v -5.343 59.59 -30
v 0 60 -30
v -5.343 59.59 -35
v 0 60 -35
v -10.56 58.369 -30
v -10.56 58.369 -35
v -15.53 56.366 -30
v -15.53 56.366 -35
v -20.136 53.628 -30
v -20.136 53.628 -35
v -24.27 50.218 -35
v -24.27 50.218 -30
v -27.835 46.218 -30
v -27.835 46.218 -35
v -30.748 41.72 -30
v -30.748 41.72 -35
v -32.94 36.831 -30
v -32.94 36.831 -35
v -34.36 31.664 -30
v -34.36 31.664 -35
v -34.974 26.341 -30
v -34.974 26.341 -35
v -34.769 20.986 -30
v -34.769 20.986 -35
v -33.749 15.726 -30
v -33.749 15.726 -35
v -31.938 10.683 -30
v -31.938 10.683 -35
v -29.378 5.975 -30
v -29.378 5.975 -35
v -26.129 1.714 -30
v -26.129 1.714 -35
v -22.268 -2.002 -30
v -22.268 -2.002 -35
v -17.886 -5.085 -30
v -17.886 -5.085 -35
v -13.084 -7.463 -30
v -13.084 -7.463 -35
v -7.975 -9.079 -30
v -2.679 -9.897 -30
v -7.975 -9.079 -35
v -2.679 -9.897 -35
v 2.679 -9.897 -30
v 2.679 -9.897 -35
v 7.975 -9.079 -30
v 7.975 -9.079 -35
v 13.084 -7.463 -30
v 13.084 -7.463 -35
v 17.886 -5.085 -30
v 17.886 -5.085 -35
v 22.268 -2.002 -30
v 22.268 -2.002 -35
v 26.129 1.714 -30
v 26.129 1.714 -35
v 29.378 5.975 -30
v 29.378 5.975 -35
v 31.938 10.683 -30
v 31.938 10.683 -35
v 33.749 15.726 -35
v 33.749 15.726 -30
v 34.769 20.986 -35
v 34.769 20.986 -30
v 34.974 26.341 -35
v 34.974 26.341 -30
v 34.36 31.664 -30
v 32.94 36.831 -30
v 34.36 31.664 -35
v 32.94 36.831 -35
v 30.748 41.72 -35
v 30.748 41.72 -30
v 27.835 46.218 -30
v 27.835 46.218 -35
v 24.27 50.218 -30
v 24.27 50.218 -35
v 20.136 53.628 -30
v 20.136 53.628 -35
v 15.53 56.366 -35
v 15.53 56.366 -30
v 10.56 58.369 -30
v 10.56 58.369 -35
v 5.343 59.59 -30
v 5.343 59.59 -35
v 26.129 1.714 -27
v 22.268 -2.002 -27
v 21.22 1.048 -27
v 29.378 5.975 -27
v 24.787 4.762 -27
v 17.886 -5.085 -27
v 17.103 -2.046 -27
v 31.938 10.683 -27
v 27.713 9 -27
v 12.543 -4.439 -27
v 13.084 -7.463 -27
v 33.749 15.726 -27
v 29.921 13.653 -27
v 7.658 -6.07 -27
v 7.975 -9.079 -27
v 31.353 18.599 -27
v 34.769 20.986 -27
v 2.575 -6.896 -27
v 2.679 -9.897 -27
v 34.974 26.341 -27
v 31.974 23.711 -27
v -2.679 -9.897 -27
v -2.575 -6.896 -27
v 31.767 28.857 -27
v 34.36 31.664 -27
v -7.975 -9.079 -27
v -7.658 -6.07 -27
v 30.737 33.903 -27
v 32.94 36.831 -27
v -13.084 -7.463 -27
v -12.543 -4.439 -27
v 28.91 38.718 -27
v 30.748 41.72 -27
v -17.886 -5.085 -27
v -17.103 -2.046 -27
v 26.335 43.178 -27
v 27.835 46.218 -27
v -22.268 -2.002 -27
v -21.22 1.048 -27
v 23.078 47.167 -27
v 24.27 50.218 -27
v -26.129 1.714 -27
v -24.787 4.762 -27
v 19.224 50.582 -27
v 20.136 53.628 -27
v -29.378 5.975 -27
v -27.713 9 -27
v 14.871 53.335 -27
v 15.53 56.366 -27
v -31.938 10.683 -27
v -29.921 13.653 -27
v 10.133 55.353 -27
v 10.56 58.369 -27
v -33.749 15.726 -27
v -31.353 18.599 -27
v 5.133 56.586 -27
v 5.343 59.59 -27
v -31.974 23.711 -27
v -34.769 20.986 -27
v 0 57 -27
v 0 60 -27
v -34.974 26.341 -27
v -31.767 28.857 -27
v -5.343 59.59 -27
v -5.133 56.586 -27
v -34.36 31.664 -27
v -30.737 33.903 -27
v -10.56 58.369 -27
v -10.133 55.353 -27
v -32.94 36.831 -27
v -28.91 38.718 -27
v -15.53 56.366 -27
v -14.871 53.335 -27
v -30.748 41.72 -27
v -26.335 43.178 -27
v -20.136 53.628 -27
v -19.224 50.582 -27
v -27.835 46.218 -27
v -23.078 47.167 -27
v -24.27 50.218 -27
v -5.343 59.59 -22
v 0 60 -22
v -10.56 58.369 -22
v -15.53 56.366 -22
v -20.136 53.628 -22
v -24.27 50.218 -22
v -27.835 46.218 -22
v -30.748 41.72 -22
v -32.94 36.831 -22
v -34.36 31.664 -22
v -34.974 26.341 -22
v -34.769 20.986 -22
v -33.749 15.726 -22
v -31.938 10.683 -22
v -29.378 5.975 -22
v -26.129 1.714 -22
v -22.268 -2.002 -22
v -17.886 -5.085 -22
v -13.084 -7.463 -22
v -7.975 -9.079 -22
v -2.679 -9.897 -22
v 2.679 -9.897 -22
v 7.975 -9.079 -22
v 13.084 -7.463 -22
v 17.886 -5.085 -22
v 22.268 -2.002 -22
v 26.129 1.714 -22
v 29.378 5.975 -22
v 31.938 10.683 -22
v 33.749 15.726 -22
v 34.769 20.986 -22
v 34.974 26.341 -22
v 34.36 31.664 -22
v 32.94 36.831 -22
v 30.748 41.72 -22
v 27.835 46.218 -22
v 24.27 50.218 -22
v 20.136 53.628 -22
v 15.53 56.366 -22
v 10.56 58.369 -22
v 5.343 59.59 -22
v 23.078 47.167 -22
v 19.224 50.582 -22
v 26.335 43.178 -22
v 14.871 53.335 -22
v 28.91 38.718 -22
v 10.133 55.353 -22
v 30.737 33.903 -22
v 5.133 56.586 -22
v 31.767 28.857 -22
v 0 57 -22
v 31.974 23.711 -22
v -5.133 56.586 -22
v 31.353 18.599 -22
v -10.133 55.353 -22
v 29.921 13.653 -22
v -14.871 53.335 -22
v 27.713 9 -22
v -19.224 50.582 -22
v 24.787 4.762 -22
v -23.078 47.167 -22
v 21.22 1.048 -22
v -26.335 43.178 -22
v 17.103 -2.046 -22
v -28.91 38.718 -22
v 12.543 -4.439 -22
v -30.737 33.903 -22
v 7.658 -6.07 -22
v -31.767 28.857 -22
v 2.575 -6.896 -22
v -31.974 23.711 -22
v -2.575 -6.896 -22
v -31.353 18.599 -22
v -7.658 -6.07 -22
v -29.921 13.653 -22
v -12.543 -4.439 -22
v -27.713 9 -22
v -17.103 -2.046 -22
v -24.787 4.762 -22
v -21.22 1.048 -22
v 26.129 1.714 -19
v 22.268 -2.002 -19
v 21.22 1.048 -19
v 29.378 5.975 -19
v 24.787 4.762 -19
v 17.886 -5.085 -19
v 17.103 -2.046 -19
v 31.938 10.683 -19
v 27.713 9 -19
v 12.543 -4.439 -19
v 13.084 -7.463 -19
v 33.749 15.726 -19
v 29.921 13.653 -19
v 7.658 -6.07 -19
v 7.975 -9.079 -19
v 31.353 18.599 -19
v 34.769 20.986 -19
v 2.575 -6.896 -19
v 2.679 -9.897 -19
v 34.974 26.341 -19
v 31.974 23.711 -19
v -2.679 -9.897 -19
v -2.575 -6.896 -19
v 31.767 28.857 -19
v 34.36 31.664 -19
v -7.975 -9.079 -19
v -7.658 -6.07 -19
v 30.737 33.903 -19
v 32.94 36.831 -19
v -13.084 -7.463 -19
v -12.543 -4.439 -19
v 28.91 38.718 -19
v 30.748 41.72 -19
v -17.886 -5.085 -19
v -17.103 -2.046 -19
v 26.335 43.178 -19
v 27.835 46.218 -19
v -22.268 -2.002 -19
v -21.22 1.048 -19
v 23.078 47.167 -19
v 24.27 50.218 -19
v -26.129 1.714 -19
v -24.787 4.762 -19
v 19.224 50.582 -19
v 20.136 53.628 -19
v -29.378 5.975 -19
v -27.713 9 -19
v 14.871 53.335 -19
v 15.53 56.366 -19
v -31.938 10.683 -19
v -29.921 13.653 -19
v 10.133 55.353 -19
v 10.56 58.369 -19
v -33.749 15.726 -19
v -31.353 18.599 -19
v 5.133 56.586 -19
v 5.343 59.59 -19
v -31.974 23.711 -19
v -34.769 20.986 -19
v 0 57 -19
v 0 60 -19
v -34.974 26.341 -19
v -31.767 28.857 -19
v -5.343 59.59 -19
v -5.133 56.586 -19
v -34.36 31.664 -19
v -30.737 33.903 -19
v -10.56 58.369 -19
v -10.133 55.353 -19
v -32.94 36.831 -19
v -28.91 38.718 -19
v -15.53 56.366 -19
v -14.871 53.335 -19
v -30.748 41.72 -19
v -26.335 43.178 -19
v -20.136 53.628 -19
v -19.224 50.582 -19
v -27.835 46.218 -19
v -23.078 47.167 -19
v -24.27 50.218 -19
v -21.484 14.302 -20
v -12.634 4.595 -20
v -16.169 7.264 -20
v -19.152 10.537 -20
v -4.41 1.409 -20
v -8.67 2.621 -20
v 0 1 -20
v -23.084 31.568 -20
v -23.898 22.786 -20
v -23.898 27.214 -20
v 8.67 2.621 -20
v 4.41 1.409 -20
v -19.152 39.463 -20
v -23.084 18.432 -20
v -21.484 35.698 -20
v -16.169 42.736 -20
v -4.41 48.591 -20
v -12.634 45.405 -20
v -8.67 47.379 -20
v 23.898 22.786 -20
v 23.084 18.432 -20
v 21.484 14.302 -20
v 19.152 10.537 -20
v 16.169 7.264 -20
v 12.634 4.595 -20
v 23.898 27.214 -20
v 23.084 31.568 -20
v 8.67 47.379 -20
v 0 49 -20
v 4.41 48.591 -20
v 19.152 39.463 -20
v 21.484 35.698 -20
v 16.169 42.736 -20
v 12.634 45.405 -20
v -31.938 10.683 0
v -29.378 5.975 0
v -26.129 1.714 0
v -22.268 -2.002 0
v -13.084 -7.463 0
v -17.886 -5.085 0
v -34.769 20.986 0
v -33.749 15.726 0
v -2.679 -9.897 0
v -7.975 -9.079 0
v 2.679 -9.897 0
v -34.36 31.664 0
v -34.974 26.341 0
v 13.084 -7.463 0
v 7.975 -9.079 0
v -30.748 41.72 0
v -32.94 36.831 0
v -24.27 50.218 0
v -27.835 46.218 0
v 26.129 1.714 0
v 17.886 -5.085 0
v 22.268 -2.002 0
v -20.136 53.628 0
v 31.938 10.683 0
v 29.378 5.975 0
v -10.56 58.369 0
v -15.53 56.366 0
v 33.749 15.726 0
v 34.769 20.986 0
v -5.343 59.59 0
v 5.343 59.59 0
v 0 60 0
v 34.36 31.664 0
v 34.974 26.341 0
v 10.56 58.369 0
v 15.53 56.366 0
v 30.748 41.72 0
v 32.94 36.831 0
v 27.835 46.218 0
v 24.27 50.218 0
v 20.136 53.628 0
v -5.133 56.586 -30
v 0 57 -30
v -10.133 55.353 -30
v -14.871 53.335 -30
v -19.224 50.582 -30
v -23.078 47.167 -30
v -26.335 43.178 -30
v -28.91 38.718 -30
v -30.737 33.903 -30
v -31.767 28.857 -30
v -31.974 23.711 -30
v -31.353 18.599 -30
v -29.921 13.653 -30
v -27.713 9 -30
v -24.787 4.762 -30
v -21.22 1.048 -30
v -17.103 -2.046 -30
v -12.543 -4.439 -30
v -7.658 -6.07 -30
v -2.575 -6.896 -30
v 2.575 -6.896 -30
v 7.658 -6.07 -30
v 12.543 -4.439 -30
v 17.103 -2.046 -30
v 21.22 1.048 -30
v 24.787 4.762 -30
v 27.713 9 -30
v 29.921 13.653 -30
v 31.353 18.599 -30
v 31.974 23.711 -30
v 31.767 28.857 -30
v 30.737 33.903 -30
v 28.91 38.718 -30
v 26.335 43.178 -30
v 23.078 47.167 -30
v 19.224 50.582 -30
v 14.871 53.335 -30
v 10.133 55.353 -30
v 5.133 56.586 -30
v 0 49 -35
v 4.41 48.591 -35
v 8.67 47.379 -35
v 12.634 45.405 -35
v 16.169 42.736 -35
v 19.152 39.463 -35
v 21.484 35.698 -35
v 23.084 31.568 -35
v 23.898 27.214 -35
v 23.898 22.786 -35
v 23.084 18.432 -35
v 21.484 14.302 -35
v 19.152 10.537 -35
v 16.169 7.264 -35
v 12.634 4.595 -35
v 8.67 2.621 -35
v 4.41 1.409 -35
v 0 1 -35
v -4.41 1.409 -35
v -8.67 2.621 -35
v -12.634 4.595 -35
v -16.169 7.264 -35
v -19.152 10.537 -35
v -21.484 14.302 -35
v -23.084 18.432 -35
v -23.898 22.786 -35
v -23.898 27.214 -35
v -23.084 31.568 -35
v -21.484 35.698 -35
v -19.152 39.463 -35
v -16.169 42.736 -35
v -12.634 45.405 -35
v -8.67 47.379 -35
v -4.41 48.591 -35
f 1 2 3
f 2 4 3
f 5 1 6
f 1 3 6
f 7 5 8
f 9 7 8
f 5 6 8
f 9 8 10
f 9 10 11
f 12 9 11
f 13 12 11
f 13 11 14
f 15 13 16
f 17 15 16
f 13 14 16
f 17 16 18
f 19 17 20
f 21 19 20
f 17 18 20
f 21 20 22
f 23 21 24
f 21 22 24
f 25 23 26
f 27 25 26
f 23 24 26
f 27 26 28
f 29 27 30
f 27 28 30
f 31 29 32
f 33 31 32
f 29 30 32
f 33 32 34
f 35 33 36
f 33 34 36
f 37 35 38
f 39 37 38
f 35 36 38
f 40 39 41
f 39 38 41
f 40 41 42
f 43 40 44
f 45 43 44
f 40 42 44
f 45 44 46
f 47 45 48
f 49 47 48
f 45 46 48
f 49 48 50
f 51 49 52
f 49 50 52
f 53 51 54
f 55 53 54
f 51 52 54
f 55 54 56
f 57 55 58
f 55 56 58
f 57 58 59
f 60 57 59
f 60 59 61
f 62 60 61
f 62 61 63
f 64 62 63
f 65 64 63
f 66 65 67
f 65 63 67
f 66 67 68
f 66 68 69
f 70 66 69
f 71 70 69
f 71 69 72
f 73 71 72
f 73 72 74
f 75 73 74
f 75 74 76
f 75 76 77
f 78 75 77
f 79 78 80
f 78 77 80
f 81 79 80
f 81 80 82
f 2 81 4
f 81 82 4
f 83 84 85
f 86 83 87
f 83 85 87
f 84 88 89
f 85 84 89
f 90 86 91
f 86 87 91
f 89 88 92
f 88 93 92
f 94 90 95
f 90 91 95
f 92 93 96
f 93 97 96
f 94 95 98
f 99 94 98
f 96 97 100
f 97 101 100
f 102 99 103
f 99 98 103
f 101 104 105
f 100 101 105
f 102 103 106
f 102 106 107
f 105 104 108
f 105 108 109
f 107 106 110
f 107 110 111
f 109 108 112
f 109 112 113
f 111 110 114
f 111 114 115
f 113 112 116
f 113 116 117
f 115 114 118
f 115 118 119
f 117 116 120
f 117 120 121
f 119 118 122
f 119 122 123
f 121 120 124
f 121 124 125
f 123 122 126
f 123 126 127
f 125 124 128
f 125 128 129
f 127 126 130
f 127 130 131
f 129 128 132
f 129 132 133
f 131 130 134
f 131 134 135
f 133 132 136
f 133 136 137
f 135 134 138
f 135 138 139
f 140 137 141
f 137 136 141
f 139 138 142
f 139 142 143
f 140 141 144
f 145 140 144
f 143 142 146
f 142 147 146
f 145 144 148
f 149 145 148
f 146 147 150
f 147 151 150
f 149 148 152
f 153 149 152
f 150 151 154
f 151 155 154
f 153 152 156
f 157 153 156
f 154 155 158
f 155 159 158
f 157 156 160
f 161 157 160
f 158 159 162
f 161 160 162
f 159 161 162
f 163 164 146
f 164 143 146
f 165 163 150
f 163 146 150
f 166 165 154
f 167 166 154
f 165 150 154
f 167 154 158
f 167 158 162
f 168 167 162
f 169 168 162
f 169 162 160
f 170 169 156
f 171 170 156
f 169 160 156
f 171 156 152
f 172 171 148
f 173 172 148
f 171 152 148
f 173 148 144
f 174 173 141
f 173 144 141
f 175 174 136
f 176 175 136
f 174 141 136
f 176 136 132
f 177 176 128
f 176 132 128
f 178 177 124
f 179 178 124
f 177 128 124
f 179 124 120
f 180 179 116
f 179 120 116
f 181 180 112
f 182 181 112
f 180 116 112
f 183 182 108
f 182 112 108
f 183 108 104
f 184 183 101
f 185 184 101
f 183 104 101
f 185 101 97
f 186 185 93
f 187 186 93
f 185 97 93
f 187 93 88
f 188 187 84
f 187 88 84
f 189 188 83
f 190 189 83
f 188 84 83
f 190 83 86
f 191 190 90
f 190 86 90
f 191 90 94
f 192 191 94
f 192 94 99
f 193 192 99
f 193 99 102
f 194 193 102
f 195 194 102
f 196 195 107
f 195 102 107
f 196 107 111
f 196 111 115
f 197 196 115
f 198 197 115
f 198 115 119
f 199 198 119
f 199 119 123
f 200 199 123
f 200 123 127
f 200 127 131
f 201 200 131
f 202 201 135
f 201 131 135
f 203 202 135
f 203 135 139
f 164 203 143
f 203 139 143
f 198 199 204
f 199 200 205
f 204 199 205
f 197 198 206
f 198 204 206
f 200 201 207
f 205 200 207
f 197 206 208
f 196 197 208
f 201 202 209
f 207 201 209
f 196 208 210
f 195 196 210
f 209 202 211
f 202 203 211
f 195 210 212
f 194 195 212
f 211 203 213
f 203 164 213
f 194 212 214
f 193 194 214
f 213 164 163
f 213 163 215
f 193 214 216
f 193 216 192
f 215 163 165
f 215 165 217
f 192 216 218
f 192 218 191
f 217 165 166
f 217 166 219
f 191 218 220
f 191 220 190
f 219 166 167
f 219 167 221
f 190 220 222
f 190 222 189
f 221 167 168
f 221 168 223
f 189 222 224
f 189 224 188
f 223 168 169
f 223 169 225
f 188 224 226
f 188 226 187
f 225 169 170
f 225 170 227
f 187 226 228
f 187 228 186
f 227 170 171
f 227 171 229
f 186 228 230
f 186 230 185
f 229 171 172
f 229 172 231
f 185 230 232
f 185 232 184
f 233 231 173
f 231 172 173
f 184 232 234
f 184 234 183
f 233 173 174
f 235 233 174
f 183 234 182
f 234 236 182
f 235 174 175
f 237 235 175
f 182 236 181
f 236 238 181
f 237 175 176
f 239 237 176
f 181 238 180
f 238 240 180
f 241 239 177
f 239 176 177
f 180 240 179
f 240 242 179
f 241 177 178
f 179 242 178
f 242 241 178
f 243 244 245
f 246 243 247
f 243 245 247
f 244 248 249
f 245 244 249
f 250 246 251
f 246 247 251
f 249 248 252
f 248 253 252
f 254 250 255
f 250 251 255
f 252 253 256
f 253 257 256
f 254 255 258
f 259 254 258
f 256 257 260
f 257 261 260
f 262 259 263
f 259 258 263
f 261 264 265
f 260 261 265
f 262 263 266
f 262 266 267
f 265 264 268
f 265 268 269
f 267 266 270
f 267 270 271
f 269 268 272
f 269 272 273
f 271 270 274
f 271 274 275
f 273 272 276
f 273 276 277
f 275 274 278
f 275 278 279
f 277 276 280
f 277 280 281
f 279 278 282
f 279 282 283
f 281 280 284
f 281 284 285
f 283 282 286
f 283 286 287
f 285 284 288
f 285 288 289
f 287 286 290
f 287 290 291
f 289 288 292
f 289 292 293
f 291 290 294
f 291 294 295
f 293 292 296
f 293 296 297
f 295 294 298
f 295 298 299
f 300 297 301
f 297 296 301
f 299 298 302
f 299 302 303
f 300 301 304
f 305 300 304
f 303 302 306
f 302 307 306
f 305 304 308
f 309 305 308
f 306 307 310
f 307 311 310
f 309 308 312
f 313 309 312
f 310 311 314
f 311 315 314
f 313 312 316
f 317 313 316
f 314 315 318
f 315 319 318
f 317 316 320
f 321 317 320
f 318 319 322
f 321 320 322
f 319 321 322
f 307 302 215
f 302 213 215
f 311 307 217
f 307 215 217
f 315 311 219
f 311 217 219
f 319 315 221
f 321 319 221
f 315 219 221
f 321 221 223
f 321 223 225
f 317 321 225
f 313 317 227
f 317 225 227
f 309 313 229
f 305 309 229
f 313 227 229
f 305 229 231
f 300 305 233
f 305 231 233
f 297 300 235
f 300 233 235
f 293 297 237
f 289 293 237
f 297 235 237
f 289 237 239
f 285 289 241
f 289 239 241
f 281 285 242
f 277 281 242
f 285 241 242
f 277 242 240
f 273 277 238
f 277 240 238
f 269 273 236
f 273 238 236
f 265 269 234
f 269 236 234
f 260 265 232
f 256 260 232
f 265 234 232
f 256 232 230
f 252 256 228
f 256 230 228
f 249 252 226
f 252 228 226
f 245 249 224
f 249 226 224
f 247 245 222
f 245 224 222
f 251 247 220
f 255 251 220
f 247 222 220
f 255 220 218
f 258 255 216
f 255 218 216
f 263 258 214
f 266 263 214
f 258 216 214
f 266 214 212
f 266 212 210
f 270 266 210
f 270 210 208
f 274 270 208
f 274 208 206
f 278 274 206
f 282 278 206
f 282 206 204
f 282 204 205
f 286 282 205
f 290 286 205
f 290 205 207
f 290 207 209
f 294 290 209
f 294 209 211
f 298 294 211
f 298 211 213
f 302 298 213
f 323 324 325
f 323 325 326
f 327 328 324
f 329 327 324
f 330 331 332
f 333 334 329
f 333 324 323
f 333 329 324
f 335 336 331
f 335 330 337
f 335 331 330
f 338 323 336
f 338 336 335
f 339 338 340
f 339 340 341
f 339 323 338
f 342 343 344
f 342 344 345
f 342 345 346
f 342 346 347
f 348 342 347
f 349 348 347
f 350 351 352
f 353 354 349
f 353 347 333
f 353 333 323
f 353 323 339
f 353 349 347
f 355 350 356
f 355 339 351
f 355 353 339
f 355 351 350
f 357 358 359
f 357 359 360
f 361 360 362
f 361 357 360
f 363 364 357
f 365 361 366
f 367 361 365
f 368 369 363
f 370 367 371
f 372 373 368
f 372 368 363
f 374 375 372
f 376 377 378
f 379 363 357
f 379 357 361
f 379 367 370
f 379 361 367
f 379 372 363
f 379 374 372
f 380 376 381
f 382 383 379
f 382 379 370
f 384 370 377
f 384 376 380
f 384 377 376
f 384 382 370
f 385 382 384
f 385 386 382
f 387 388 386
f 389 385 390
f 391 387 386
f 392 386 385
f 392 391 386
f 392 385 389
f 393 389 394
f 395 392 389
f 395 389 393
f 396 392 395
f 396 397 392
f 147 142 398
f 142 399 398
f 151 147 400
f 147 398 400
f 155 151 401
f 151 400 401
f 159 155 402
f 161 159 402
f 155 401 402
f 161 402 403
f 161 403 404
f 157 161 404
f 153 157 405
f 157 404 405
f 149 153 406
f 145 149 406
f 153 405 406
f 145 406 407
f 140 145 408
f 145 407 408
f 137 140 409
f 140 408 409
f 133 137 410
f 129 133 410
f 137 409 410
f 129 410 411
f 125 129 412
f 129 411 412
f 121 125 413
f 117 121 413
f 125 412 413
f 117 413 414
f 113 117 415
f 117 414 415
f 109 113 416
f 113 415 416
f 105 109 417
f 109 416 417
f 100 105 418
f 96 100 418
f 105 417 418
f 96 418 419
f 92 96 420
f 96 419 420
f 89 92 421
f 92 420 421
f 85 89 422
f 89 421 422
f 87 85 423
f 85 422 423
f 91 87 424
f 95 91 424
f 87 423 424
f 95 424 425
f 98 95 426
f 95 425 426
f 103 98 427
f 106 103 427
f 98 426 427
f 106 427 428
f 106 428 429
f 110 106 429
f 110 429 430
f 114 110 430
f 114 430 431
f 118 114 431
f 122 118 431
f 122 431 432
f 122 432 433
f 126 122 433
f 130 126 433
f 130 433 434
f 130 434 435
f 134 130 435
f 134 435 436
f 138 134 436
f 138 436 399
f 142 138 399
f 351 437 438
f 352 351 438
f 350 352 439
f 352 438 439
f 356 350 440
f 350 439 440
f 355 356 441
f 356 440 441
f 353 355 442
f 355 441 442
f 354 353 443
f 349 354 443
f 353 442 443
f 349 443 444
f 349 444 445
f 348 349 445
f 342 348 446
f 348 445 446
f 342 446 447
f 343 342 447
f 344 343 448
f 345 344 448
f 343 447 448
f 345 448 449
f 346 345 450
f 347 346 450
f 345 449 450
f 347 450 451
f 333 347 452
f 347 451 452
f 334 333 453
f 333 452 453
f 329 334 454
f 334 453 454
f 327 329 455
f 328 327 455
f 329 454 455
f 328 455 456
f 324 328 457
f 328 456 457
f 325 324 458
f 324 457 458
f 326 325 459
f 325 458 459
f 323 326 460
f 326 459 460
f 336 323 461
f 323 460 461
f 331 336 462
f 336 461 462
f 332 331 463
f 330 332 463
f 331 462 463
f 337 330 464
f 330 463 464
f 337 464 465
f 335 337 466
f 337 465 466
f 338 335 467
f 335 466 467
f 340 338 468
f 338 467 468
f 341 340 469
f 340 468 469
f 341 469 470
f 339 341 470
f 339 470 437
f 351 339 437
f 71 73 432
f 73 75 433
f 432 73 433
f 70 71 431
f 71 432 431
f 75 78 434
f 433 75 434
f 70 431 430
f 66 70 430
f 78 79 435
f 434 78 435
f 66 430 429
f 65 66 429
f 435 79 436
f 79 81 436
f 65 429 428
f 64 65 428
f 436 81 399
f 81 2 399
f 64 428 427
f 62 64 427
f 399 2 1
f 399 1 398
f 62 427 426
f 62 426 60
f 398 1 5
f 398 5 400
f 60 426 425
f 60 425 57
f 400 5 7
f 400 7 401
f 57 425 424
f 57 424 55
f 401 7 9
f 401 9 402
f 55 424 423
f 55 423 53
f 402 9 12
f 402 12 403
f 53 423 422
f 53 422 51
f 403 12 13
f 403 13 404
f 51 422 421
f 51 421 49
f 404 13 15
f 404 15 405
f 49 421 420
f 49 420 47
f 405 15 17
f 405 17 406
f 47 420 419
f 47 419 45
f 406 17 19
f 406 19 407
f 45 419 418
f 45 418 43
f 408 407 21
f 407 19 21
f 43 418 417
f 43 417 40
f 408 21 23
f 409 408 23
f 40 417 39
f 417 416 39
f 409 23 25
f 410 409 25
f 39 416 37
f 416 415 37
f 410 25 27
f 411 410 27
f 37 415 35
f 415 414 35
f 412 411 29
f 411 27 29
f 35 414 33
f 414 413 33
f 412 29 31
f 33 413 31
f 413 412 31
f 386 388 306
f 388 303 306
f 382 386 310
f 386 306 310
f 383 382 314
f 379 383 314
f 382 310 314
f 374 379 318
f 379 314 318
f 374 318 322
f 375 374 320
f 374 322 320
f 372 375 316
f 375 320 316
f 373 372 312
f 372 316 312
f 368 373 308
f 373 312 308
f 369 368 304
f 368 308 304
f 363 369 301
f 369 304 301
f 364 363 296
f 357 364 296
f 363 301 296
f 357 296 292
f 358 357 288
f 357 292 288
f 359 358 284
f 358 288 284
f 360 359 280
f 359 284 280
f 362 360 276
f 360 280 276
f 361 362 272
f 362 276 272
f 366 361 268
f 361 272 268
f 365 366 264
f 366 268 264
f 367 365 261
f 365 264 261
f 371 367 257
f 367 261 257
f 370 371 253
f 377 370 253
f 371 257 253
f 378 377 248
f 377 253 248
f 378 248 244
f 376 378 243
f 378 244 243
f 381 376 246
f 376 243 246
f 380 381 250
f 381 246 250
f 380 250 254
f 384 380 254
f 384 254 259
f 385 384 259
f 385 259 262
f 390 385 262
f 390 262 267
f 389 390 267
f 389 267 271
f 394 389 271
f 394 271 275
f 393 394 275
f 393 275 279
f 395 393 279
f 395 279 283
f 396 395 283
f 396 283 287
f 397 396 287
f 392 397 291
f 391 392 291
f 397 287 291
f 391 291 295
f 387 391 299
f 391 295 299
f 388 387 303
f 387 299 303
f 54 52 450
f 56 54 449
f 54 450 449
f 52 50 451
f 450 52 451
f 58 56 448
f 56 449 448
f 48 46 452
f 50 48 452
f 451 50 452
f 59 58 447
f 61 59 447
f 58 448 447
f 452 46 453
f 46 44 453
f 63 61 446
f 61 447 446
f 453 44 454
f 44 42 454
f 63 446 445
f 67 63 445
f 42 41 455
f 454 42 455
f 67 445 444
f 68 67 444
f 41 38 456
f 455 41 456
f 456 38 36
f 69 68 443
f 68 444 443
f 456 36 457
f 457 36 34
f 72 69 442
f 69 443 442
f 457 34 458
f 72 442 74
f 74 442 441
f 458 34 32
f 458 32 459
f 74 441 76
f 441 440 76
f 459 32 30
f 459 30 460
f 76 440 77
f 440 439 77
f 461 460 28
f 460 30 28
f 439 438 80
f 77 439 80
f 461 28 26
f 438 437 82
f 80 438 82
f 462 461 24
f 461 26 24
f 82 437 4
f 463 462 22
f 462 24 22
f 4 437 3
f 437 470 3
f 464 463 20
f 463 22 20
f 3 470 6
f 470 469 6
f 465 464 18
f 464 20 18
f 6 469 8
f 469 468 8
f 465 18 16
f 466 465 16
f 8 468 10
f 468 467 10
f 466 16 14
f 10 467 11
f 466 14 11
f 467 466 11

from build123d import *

# Parameters (mm, degrees)
BOSS_EXTRUDE4_REACH = 79.782
SKETCH4_R           = 25
SKETCH5_R           = 24
CUT_EXTRUDE5_DEPTH  = 15


with BuildPart() as part:
    # Sketch1 → Revolve1 (revolve)
    with BuildSketch(Plane(origin=(0, 0, 0), x_dir=(0, 0, -1), z_dir=(1, 0, 0)), mode=Mode.PRIVATE) as revolve1_sk:
        Polygon((0, 0), (0, -10), (19, -10), (19, -7), (22, -7), (22, -10), (27, -10), (27, -7), (30, -7), (30, -10), (35, -10), (35, 25), (15, 25), (15, 0), align=None)
    revolve(revolve1_sk.sketch.rotate(Axis((0, 25, -35), (0, 0, 1)), 180), axis=Axis((0, 25, -35), (0, 0, 1)))

    # Sketch4 → Boss-Extrude4 (add, up to next)
    with BuildSketch(Plane.XY, mode=Mode.PRIVATE) as boss_extrude4_sk1:
        with Locations((0, 25)):
            Circle(SKETCH4_R)
    boss_extrude4_tool1 = extrude(boss_extrude4_sk1.sketch, amount=-BOSS_EXTRUDE4_REACH, mode=Mode.PRIVATE) - part.part
    add(boss_extrude4_tool1.solids().sort_by_distance((0, 25, 0))[0])

    # Sketch5 → Cut-Extrude5 (cut)
    with BuildSketch(Plane(origin=(0, 0, -35), x_dir=(-1, 0, 0), z_dir=(0, 0, -1))):
        with Locations(Location((0, 25, 0), (0, 0, 90))):
            Circle(SKETCH5_R)
    extrude(amount=-CUT_EXTRUDE5_DEPTH, mode=Mode.SUBTRACT)


solid = part.part
